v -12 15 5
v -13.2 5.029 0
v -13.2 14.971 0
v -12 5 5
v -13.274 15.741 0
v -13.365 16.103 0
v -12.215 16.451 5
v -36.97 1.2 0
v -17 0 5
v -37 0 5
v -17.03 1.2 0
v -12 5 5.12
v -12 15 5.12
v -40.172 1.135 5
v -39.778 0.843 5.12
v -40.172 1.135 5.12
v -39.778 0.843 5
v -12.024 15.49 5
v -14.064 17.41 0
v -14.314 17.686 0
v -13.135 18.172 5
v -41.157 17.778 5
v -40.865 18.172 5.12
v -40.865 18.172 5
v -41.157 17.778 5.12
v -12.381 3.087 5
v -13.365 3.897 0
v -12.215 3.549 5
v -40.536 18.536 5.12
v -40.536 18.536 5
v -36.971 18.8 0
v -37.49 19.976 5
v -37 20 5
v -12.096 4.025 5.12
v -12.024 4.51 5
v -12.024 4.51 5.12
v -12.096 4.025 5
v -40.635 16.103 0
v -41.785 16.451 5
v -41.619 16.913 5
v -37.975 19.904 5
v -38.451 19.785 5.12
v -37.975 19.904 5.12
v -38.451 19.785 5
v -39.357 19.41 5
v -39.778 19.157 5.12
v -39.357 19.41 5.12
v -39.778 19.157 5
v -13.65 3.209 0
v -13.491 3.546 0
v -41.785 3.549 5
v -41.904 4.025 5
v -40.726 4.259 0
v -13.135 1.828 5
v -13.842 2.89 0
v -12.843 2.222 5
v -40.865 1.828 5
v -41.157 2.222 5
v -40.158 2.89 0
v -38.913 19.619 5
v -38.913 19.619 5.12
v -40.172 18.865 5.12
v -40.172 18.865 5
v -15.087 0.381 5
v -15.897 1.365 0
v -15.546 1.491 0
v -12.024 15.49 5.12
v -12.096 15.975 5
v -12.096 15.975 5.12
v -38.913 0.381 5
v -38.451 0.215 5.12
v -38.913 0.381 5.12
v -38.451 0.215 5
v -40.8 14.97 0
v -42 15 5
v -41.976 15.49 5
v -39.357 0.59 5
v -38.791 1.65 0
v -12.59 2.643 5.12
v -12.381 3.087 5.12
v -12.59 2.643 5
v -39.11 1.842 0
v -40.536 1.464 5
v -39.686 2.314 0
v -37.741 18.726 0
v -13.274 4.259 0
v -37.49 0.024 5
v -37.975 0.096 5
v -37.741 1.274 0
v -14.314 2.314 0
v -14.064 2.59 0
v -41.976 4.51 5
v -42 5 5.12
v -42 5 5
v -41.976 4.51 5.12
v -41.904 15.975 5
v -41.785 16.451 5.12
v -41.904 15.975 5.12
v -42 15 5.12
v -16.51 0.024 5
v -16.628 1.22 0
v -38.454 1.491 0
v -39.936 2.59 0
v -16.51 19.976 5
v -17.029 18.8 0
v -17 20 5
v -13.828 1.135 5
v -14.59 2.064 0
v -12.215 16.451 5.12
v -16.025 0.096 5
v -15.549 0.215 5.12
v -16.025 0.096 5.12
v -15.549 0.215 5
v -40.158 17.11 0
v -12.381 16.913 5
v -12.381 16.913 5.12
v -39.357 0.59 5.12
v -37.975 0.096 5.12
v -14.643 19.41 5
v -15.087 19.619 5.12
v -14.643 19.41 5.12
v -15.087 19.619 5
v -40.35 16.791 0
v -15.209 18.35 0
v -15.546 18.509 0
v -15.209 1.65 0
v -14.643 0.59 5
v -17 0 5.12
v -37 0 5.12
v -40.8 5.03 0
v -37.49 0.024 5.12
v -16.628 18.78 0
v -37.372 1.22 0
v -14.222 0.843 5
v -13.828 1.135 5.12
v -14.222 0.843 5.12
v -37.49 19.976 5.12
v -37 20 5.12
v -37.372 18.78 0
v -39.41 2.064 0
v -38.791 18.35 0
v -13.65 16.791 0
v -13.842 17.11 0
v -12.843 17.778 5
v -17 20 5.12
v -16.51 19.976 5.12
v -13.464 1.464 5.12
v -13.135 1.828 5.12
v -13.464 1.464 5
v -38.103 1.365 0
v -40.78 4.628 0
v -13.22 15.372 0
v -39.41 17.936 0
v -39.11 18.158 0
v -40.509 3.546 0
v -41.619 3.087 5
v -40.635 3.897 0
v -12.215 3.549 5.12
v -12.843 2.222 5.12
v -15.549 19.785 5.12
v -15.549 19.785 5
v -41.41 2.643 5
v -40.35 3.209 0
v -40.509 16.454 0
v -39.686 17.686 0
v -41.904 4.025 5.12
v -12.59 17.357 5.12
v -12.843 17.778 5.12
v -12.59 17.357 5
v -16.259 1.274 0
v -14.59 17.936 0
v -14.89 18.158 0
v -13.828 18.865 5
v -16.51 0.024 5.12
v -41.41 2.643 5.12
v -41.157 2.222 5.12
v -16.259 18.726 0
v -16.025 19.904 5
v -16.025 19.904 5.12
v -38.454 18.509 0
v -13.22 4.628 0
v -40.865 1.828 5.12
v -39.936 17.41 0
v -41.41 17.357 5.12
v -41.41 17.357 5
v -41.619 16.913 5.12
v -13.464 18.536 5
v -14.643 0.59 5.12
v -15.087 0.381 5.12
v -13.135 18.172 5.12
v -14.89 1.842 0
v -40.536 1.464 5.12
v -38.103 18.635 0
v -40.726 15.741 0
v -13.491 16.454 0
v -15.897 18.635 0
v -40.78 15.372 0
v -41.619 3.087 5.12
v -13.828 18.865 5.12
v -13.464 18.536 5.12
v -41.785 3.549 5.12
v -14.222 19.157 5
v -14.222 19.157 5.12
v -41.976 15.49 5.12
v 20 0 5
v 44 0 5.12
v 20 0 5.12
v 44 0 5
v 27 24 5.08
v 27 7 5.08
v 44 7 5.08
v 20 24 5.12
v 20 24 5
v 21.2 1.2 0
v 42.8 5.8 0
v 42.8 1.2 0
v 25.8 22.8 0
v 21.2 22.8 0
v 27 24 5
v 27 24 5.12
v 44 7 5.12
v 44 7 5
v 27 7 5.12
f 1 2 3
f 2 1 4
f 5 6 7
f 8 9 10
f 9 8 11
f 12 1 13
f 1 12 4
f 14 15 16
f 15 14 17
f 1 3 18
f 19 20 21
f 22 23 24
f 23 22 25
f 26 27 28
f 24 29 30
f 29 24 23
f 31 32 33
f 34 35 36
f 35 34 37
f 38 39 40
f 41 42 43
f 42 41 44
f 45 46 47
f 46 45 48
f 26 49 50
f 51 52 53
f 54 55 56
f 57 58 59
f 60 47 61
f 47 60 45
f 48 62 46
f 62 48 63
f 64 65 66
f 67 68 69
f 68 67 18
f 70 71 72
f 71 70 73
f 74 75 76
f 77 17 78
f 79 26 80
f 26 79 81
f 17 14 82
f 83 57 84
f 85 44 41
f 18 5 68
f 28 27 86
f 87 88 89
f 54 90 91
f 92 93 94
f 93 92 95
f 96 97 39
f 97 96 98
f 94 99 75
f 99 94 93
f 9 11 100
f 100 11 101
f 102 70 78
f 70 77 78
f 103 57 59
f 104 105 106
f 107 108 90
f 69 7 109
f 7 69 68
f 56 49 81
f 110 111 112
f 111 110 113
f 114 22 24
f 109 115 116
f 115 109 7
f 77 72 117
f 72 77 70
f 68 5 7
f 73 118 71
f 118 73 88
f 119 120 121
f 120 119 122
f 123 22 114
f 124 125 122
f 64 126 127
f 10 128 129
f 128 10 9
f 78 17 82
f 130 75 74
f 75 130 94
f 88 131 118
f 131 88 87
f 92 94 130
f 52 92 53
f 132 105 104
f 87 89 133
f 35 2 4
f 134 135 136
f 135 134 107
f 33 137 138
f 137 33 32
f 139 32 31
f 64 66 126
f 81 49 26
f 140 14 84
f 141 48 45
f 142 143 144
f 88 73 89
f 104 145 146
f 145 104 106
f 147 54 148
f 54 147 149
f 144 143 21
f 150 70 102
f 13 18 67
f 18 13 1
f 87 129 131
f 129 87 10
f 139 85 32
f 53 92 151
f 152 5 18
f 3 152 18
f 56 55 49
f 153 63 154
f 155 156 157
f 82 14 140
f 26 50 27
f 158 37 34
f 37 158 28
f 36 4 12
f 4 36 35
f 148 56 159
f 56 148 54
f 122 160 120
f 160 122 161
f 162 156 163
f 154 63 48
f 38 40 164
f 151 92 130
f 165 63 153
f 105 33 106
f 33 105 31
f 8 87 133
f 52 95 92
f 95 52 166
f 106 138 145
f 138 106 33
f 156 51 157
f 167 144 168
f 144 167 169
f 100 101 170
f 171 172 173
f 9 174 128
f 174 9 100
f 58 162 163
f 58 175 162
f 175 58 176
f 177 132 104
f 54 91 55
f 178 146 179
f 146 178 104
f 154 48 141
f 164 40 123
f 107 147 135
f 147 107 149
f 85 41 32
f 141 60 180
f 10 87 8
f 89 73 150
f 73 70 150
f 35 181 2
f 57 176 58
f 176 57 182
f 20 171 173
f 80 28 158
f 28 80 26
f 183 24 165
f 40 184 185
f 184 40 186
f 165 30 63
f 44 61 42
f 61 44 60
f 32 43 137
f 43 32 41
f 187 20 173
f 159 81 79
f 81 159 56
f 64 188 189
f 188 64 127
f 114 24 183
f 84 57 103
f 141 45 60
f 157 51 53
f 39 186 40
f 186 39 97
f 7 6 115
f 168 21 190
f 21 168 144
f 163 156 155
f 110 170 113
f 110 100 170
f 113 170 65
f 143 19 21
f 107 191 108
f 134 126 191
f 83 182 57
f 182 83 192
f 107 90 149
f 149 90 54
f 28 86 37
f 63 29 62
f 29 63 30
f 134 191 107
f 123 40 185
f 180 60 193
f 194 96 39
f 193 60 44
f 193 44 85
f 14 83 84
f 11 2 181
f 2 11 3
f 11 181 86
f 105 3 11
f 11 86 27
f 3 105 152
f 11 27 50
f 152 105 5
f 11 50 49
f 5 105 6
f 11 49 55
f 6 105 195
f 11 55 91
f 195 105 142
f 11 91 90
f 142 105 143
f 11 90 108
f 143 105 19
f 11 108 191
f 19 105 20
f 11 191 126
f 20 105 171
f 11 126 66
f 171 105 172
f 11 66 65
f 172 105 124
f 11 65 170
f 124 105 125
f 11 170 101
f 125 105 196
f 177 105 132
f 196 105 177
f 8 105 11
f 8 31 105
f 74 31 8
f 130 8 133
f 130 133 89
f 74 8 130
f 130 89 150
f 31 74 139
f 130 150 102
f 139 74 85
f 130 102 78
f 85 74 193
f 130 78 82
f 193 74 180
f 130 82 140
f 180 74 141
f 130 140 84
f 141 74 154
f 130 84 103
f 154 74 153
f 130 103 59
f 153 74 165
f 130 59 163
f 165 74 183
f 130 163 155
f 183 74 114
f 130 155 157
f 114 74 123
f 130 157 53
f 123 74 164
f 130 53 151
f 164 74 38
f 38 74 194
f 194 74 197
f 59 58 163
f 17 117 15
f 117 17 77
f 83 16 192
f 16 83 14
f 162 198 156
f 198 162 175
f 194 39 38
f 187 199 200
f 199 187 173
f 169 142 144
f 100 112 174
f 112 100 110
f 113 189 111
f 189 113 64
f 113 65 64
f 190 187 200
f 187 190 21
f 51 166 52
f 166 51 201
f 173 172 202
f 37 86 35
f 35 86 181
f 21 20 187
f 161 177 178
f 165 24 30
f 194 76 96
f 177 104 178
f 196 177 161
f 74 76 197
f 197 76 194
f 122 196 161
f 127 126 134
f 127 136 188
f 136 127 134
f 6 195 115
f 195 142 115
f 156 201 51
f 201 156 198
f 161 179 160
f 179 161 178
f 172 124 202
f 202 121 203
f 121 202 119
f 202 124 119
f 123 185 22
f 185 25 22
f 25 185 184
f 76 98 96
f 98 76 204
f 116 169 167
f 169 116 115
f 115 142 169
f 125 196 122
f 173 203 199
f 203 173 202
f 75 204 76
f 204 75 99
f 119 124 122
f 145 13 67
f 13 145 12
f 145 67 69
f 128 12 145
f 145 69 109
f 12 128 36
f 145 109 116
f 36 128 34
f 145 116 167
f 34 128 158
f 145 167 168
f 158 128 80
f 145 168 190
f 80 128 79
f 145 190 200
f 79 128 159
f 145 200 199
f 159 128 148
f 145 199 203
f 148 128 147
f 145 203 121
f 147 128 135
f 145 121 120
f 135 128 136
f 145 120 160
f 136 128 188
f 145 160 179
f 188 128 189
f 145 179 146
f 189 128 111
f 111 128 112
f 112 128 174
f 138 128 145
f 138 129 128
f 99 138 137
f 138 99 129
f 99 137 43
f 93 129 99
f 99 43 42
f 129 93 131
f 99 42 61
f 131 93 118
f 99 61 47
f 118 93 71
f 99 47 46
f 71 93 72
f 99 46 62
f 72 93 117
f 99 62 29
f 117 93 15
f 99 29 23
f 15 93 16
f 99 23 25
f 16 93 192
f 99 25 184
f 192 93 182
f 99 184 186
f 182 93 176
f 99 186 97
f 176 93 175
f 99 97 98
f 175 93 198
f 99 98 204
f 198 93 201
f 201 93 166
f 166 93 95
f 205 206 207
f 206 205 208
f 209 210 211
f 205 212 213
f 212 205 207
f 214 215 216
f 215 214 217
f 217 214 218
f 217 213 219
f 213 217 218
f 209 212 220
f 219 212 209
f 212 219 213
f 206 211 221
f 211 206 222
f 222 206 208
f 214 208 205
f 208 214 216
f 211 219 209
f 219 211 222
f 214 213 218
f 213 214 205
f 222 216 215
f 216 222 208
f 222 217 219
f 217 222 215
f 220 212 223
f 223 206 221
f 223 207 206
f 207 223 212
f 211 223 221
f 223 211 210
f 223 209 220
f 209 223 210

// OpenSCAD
// Rounded rectangular tube — construction walkthrough.
//
// This file is deliberately separate from the printable example.
// It exposes the intermediate geometry used to create the two end chamfers
// and finishes with a comparison showing why the same global hull() idea
// becomes harder for a concave L-shaped bracket.

$fn = 64;

design_step = "09_convex_vs_concave"; // [01_profiles,02_outer_chamfer_inputs,03_outer_hull,04_hollow_tube,05_inner_chamfer_inputs,06_inner_chamfer_cut,07_bottom_chamfer_result,08_final,09_convex_vs_concave]

outer_width    = 30;
outer_depth    = 20;
length         = 60;
wall_thickness = 2.5;
outer_radius   = 5;

inner_chamfer = 0.6;
outer_chamfer = 0.4;
epsilon = 0.01;

inner_width  = outer_width - 2 * wall_thickness;
inner_depth  = outer_depth - 2 * wall_thickness;
inner_radius = max(outer_radius - wall_thickness, 0.01);

module rounded_rectangle(width, depth, radius) {
    hull()
        for (x = [radius, width - radius],
             y = [radius, depth - radius])
            translate([x, y])
                circle(radius);
}

module outer_2d()
    rounded_rectangle(outer_width, outer_depth, outer_radius);

module inner_2d()
    translate([wall_thickness, wall_thickness])
        rounded_rectangle(inner_width, inner_depth, inner_radius);

module thin_outer_profile(z, inset = 0, thickness = 0.08) {
    translate([0, 0, z])
        linear_extrude(thickness)
            offset(delta = inset)
                outer_2d();
}

module thin_inner_profile(z, expansion = 0, thickness = 0.08) {
    translate([0, 0, z])
        linear_extrude(thickness)
            offset(delta = expansion)
                inner_2d();
}

module outer_body() {
    hull() {
        translate([0, 0, 0])
            linear_extrude(epsilon)
                offset(delta = -outer_chamfer)
                    outer_2d();

        translate([0, 0, outer_chamfer])
            linear_extrude(length - 2 * outer_chamfer)
                outer_2d();

        translate([0, 0, length - epsilon])
            linear_extrude(epsilon)
                offset(delta = -outer_chamfer)
                    outer_2d();
    }
}

module continuous_inner_void(extra = 1) {
    translate([0, 0, -extra])
        linear_extrude(length + 2 * extra)
            inner_2d();
}

module inner_chamfer_cut() {
    hull() {
        translate([0, 0, -epsilon])
            linear_extrude(2 * epsilon)
                offset(r = inner_chamfer)
                    inner_2d();

        translate([0, 0, inner_chamfer])
            linear_extrude(epsilon)
                inner_2d();
    }
}

module hollow_tube_without_inner_chamfers() {
    difference() {
        outer_body();
        continuous_inner_void();
    }
}

module final_tube() {
    difference() {
        hollow_tube_without_inner_chamfers();

        inner_chamfer_cut();

        translate([0, 0, length])
            mirror([0, 0, 1])
                inner_chamfer_cut();
    }
}

// A deliberately simple concave L profile for the final comparison.
// This is not the full corner-bracket model; it isolates the hull() issue.
module l_profile_2d(size = 24, wall = 7) {
    union() {
        square([size, wall]);
        square([wall, size]);
    }
}

module l_layer(z, inset = 0, thickness = 0.08) {
    translate([0, 0, z])
        linear_extrude(thickness)
            offset(delta = inset)
                l_profile_2d();
}

module l_global_hull(height = 5, inset = -1.2) {
    hull() {
        l_layer(0, inset);
        l_layer(height, 0);
    }
}

module profiles_stage() {
    color([0.25, 0.55, 0.85])
        linear_extrude(1)
            outer_2d();

    color([1.0, 0.55, 0.15])
        translate([0, 0, 1.1])
            linear_extrude(1)
                inner_2d();
}

module outer_chamfer_inputs_stage() {
    // Close-up of the real 0.4 mm bottom chamfer.
    color([0.95, 0.45, 0.15])
        thin_outer_profile(0, -outer_chamfer, 0.06);

    color([0.20, 0.60, 0.90])
        thin_outer_profile(outer_chamfer, 0, 0.06);

    // A short continuation makes the relationship to the full tube obvious.
    color([0.70, 0.80, 0.90, 0.45])
        translate([0, 0, outer_chamfer])
            linear_extrude(5)
                outer_2d();
}

module outer_hull_stage() {
    // Only show the lower 8 mm so the 0.4 mm chamfer stays visible.
    intersection() {
        outer_body();
        translate([-2, -2, -0.2])
            cube([outer_width + 4, outer_depth + 4, 8]);
    }
}

module hollow_stage() {
    difference() {
        intersection() {
            outer_body();
            translate([-2, -2, -0.2])
                cube([outer_width + 4, outer_depth + 4, 12]);
        }
        continuous_inner_void();
    }
}

module inner_chamfer_inputs_stage() {
    // The orange opening is larger at the end face.
    color([0.95, 0.45, 0.15])
        thin_inner_profile(0, inner_chamfer, 0.06);

    // The blue opening is the normal hole 0.6 mm inside the tube.
    color([0.20, 0.60, 0.90])
        thin_inner_profile(inner_chamfer, 0, 0.06);

    // Ghost the surrounding tube so it is clear these are cutting profiles.
    %intersection() {
        hollow_tube_without_inner_chamfers();
        translate([-2, -2, -0.2])
            cube([outer_width + 4, outer_depth + 4, 7]);
    }
}

module inner_chamfer_cut_stage() {
    color([0.95, 0.35, 0.12])
        inner_chamfer_cut();

    %intersection() {
        hollow_tube_without_inner_chamfers();
        translate([-2, -2, -0.2])
            cube([outer_width + 4, outer_depth + 4, 7]);
    }
}

module bottom_chamfer_result_stage() {
    difference() {
        intersection() {
            hollow_tube_without_inner_chamfers();
            translate([-2, -2, -0.2])
                cube([outer_width + 4, outer_depth + 4, 8]);
        }
        inner_chamfer_cut();
    }
}

module convex_vs_concave_stage() {
    // LEFT: convex rounded rectangle. Hull can connect the two complete
    // profiles without inventing an unwanted bridge across an opening.
    translate([-42, 0, 0]) {
        color([0.20, 0.60, 0.90, 0.45])
            hull() {
                thin_outer_profile(0, -1.2);
                thin_outer_profile(5, 0);
            }

        color([0.95, 0.45, 0.15])
            thin_outer_profile(0, -1.2, 0.12);

        color([0.10, 0.35, 0.70])
            thin_outer_profile(5, 0, 0.12);
    }

    // RIGHT: concave L. hull() is convex by definition, so the result bridges
    // across the missing quadrant. That bridge is exactly why the bracket
    // needs extra clipping/subtractive logic instead of one global hull().
    translate([20, 0, 0]) {
        color([0.85, 0.25, 0.20, 0.40])
            l_global_hull();

        color([0.95, 0.45, 0.15])
            l_layer(0, -1.2, 0.12);

        color([0.10, 0.35, 0.70])
            l_layer(5, 0, 0.12);

        // Show the intended open quadrant as a reference void.
        %translate([7, 7, -0.5])
            cube([17, 17, 6]);
    }
}

if (design_step == "01_profiles")
    profiles_stage();
else if (design_step == "02_outer_chamfer_inputs")
    outer_chamfer_inputs_stage();
else if (design_step == "03_outer_hull")
    outer_hull_stage();
else if (design_step == "04_hollow_tube")
    hollow_stage();
else if (design_step == "05_inner_chamfer_inputs")
    inner_chamfer_inputs_stage();
else if (design_step == "06_inner_chamfer_cut")
    inner_chamfer_cut_stage();
else if (design_step == "07_bottom_chamfer_result")
    bottom_chamfer_result_stage();
else if (design_step == "08_final")
    final_tube();
else
    convex_vs_concave_stage();
